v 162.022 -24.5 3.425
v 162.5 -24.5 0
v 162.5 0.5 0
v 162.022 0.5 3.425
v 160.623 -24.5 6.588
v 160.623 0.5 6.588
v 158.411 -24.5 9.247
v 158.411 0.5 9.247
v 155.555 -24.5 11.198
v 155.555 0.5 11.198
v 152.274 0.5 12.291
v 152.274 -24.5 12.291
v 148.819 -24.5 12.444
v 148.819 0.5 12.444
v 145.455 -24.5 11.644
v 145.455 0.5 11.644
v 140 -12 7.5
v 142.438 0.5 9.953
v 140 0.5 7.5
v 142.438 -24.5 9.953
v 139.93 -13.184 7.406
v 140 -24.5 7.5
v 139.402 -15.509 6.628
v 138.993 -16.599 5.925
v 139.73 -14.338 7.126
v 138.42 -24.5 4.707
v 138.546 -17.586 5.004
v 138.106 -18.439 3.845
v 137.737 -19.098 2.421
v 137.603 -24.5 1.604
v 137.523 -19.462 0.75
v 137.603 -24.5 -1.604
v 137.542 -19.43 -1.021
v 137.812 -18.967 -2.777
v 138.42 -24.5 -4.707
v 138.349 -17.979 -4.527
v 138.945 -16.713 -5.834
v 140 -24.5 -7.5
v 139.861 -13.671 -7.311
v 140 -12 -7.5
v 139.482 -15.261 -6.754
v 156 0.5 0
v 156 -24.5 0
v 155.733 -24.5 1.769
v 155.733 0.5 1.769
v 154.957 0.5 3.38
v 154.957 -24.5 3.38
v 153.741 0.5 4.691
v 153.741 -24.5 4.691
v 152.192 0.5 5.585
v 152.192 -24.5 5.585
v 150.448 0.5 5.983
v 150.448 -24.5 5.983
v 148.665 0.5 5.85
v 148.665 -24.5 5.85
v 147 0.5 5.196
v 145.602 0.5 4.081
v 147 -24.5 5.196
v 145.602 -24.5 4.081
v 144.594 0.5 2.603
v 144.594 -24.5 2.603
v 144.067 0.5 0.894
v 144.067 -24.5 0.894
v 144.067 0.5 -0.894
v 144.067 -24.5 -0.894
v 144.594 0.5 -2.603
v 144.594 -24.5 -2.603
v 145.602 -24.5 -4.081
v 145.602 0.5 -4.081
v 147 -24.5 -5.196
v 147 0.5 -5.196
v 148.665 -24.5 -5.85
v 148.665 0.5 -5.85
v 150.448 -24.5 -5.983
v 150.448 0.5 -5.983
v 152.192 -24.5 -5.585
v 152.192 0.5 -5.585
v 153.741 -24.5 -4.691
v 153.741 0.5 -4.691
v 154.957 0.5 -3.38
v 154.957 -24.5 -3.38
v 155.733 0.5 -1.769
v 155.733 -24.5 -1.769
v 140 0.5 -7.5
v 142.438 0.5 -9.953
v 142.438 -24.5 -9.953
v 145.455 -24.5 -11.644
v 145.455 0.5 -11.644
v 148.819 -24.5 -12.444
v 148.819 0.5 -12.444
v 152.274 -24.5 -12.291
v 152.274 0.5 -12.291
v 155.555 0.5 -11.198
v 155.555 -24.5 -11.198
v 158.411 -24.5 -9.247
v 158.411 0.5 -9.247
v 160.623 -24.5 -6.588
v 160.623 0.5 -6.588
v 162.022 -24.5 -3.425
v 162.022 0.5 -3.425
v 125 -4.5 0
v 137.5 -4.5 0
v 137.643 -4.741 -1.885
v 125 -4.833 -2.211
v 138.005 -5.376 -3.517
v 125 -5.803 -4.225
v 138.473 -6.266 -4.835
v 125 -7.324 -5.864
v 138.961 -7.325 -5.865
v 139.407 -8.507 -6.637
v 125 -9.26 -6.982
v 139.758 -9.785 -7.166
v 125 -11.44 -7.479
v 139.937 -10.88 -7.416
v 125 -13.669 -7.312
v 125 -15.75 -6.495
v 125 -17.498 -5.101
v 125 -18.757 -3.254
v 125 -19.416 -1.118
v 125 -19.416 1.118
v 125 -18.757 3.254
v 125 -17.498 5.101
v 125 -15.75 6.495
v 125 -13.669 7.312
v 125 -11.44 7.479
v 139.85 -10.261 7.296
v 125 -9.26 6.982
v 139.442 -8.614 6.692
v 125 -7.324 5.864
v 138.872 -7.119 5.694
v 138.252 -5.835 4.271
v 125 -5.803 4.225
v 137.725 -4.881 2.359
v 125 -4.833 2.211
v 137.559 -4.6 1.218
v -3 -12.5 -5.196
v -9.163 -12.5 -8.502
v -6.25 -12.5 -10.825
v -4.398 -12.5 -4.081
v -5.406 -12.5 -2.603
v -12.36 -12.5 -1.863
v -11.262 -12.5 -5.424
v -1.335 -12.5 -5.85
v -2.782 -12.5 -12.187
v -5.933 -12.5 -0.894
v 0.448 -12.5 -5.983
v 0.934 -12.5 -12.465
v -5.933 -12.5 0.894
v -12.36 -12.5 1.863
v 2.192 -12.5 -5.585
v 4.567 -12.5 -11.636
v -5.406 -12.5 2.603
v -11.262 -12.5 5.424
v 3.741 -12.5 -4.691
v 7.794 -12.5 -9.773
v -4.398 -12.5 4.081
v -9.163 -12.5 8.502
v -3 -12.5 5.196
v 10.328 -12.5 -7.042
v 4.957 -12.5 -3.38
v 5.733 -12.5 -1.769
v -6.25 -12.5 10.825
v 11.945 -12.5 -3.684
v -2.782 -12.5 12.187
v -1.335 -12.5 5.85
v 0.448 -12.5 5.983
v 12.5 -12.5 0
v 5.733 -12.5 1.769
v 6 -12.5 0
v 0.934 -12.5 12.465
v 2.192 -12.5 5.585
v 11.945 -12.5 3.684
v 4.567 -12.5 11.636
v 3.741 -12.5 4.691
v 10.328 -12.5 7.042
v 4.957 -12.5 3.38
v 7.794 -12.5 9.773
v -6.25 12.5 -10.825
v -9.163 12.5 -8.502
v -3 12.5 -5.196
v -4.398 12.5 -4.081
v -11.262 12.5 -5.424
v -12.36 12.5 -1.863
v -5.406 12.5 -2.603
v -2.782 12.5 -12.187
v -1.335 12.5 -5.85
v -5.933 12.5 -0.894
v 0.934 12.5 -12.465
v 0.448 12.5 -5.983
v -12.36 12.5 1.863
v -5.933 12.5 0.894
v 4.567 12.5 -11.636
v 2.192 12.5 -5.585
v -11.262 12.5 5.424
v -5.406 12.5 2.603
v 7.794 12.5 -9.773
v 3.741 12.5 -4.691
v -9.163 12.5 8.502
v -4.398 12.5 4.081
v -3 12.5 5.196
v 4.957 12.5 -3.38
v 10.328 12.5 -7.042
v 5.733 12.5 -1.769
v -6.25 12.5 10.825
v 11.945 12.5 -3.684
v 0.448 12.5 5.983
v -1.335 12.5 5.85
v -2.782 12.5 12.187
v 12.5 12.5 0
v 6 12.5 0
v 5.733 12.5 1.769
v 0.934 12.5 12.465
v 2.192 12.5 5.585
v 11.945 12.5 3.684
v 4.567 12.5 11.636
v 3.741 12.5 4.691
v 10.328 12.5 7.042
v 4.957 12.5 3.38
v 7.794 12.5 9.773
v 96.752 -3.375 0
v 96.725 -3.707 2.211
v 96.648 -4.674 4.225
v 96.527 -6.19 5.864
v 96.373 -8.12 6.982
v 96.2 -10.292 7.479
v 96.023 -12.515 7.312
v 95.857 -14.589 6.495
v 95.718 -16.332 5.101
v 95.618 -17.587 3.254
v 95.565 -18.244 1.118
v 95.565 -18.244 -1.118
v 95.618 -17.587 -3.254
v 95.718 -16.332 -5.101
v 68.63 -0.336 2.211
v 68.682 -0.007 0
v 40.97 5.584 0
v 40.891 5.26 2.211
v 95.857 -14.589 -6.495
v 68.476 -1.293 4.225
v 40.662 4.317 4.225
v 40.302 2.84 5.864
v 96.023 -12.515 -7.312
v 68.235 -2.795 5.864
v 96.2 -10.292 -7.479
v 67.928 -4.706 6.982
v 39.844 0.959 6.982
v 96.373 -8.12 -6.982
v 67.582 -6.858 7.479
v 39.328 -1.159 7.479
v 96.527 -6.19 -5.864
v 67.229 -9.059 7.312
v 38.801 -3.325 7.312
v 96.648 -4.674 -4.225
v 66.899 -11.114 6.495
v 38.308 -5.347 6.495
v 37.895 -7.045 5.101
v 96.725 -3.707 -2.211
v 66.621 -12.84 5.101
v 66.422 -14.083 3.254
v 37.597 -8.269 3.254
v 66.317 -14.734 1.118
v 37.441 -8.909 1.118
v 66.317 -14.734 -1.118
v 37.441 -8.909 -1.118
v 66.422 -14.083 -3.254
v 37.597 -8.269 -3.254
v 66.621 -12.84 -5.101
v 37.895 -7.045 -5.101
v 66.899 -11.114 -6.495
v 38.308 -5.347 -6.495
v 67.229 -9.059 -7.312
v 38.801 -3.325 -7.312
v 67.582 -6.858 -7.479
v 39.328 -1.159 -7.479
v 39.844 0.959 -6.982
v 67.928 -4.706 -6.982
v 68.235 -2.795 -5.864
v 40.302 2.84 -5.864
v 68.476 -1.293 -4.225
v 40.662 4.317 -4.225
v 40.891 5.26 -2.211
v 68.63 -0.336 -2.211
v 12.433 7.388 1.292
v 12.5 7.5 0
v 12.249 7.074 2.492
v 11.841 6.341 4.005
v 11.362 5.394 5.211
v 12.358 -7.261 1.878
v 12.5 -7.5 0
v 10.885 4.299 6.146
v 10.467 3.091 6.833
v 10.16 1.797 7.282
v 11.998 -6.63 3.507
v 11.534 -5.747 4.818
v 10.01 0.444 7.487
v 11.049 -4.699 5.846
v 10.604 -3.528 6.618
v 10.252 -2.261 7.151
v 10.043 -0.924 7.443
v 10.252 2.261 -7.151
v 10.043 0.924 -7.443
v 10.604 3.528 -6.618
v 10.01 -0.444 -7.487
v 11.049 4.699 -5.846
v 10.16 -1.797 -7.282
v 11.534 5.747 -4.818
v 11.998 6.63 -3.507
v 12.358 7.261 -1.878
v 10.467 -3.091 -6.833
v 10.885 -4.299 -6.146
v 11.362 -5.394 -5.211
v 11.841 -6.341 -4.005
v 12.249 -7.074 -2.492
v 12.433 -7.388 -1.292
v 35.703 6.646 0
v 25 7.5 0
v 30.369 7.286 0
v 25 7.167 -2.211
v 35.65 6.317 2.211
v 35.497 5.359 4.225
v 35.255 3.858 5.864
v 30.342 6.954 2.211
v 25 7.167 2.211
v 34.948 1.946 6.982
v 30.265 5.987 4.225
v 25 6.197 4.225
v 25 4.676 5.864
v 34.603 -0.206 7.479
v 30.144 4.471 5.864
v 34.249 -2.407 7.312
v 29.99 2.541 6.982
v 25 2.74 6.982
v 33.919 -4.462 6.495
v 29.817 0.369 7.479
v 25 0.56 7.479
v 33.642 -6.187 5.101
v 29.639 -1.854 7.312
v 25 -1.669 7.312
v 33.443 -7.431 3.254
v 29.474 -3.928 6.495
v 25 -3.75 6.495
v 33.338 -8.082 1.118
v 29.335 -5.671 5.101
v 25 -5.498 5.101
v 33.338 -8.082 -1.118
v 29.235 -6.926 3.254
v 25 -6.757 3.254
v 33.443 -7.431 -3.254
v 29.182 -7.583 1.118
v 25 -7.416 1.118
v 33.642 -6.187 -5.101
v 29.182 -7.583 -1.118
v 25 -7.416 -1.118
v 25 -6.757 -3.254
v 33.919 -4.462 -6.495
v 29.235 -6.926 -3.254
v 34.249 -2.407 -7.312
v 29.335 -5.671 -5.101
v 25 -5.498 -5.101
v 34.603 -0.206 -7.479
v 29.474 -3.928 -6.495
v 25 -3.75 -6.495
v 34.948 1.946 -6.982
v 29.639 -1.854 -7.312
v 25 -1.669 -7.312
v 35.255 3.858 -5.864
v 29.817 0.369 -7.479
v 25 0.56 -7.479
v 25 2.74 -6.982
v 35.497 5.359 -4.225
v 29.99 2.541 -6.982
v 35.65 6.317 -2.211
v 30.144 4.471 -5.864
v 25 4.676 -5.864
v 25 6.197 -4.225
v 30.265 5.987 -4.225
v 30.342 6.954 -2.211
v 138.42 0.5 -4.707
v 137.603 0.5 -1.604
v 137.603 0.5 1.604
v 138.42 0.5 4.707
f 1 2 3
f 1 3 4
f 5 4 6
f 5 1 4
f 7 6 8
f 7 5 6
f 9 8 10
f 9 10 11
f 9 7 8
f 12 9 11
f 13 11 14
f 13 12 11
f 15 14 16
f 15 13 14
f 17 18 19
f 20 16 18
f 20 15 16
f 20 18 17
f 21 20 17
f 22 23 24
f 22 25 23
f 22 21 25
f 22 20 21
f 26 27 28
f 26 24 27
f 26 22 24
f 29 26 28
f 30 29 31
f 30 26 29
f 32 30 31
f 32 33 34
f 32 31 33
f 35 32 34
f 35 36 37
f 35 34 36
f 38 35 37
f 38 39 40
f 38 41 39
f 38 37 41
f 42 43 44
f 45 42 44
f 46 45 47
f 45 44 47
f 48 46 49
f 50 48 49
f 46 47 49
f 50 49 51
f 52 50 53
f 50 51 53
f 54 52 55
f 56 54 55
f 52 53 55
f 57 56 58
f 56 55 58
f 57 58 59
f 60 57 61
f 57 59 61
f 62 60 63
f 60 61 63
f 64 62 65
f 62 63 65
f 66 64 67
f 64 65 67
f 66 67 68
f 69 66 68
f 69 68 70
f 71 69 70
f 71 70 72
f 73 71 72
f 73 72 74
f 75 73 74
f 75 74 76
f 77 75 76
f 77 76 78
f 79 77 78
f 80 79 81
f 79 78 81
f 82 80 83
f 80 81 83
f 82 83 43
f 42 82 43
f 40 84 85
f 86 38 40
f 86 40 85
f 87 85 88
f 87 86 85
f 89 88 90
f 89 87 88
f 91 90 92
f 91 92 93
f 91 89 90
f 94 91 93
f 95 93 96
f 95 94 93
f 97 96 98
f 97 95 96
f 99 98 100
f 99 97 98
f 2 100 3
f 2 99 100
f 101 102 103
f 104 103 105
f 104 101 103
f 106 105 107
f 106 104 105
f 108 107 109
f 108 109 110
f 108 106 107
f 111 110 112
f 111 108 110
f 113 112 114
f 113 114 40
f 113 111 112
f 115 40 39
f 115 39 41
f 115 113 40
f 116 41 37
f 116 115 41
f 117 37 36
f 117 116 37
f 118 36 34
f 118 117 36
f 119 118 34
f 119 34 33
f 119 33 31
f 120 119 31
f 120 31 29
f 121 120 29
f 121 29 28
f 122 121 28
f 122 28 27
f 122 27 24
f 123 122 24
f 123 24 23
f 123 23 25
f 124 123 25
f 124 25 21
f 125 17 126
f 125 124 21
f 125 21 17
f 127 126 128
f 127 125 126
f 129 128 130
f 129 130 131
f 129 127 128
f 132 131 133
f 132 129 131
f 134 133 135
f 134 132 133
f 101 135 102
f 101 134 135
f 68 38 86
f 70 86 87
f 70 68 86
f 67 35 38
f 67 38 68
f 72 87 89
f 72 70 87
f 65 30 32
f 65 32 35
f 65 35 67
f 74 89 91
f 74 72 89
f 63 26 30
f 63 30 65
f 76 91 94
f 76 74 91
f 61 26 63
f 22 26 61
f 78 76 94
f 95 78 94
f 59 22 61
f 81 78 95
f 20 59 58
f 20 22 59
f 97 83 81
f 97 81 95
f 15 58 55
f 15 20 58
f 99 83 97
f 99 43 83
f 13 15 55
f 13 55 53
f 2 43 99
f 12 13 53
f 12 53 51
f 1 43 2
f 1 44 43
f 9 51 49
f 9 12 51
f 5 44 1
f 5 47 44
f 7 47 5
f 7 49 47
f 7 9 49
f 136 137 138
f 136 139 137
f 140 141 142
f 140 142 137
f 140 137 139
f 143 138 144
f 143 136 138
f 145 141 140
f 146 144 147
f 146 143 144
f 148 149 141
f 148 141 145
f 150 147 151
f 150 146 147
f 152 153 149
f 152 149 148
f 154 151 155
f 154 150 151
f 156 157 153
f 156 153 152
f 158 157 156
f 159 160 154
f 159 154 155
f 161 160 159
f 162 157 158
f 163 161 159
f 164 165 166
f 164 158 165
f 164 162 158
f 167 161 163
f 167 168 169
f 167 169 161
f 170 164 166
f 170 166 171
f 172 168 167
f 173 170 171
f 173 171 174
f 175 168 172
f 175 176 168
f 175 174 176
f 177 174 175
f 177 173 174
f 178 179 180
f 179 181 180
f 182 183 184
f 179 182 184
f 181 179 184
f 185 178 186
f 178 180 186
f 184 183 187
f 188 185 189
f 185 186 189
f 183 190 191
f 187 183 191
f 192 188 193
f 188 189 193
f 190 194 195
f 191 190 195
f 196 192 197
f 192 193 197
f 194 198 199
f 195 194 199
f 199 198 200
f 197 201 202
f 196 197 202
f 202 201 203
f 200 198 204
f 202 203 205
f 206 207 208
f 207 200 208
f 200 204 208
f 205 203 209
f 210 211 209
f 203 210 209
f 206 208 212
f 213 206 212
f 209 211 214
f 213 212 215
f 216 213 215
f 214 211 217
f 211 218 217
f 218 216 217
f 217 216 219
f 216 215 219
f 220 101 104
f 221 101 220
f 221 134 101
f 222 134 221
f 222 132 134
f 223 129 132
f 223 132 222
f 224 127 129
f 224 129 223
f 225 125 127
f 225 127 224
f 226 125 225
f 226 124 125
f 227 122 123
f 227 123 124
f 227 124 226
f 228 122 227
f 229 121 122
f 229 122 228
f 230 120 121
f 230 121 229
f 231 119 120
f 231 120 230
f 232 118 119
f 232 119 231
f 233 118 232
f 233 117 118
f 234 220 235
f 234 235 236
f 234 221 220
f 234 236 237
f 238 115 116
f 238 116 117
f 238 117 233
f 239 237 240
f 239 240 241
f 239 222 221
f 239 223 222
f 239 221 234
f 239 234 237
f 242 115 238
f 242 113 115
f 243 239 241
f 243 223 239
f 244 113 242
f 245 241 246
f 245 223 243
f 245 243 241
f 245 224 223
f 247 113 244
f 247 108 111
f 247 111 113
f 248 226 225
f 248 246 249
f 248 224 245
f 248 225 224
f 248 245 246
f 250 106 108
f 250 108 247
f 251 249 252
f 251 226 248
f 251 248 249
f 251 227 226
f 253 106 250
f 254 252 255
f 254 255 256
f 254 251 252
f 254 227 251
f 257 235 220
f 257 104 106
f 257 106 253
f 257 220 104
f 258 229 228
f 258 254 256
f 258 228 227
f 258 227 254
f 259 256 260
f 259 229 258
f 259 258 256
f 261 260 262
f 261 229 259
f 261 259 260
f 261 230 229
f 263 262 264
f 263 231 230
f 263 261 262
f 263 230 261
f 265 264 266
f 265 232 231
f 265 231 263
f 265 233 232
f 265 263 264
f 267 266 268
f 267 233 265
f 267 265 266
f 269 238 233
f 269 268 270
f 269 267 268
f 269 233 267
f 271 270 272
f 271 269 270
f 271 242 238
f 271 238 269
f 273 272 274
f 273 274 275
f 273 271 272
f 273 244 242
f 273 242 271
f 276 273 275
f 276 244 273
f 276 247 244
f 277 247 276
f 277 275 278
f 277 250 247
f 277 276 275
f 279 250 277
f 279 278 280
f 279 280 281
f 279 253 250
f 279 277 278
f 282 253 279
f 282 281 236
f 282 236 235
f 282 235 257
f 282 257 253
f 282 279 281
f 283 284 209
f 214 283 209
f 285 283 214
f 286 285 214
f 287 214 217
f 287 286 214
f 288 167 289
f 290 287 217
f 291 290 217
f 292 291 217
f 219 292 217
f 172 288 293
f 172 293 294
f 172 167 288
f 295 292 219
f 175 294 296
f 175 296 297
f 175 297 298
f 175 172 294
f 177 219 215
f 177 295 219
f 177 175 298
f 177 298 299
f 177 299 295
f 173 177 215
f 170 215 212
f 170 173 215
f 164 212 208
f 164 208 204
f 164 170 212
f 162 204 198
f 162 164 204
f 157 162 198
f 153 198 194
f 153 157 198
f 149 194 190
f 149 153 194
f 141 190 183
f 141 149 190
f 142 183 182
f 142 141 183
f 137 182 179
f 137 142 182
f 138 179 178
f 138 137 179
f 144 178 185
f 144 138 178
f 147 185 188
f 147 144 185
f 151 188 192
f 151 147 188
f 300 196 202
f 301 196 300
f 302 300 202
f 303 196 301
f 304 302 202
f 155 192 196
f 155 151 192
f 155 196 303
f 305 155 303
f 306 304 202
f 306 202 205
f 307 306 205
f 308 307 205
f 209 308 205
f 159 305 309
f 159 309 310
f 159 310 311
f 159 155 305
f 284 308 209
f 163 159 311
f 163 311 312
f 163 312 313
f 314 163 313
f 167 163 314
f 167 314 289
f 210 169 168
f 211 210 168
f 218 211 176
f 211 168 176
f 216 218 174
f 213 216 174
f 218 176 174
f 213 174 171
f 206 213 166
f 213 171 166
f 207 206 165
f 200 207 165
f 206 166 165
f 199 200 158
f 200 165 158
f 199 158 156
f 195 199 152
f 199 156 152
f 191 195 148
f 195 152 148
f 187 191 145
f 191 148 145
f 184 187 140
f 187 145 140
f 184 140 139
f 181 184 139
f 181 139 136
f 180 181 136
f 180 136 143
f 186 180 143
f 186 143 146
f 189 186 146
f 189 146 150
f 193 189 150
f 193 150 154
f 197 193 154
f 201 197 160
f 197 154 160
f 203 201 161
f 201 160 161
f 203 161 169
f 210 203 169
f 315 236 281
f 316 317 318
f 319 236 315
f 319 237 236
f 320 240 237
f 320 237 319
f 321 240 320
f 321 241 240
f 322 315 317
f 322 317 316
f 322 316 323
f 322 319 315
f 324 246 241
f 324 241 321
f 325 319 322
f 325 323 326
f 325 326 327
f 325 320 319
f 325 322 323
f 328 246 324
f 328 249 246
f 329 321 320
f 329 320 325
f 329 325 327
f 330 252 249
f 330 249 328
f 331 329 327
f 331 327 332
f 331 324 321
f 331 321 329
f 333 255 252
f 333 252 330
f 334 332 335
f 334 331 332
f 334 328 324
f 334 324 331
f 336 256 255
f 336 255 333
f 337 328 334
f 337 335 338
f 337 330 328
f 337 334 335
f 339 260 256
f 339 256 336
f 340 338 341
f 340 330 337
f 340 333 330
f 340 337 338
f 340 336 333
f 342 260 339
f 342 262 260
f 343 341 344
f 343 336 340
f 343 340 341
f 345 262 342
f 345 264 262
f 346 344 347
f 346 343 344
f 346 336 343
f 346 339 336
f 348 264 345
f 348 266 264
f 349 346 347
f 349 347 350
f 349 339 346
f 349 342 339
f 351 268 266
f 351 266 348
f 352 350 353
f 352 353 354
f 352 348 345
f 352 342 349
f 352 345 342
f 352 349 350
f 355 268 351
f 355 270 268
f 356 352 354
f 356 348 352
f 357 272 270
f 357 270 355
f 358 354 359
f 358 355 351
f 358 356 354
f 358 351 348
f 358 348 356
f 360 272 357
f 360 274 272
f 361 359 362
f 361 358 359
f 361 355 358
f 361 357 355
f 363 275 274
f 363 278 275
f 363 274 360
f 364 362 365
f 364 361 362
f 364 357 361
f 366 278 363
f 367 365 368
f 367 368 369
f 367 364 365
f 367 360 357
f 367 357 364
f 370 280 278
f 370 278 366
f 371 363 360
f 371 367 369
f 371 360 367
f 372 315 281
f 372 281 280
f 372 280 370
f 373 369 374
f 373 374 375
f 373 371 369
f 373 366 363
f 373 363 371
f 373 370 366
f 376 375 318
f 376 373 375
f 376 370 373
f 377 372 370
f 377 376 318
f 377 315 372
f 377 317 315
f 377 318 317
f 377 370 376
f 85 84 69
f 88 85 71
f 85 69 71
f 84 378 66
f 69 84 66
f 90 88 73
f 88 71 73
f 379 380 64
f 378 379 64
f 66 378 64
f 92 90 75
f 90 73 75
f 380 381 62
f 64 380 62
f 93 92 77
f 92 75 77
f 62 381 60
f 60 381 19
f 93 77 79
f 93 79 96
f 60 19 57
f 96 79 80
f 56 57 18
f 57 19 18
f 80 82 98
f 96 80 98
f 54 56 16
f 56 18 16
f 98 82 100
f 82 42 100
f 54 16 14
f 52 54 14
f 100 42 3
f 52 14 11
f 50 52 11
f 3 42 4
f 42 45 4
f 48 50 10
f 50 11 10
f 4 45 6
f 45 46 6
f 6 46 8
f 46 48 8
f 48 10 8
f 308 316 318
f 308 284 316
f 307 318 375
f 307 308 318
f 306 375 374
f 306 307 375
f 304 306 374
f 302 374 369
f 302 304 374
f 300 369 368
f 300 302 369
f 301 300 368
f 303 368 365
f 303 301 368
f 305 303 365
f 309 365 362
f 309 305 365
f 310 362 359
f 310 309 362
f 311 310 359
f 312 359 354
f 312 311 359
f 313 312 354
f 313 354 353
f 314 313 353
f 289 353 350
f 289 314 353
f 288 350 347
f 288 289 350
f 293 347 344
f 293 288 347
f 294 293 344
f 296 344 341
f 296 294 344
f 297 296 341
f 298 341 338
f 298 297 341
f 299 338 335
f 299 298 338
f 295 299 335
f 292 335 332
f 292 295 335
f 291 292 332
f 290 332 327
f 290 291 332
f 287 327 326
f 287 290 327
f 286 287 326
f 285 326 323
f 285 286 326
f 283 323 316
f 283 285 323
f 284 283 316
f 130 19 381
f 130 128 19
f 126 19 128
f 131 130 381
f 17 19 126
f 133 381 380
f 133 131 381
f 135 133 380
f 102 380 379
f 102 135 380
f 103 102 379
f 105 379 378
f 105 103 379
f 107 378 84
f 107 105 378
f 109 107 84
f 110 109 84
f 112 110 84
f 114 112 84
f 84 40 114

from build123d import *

# Parameters (mm, degrees)
F1_R      = 7.5
F3_R      = 12.5
F4_DEPTH  = 12.5
F5_R      = 6
F6_DEPTH  = 25
F9_DEPTH  = 12.5
F10_R     = 6
F11_DEPTH = 25


with BuildPart() as f2:
    # F2: sweep along a path in F0
    with BuildLine(Plane.XY) as f2_path:
        Line((150, -12), (125, -12))
        ThreePointArc((125, -12), (81.789999989, -9.4166667579), (39.1955835962, -1.7034700315))
        ThreePointArc((39.1955835962, -1.7034700315), (32.1487132371, -0.4273896908), (25, 0))
        Line((25, 0), (0, 0))
    # F1 (on Right) → F2 (sweep)
    with BuildSketch(Plane.YZ):
        Circle(F1_R)
    sweep(path=f2_path.line)

    # F3 (on Front) → F4 (join, symmetric)
    with BuildSketch(Plane.XZ):
        Circle(F3_R)
    extrude(amount=F4_DEPTH, both=True)

    # F5 (on face) → F6 (cut)
    with BuildSketch(Plane.XZ.offset(12.5)):
        Circle(F5_R)
    extrude(amount=-F6_DEPTH, mode=Mode.SUBTRACT)

    # F8 (on offset) → F9 (join, symmetric)
    with BuildSketch(Plane.XZ.offset(12)):
        with BuildLine():
            Line((140, -7.5), (150, -7.5))
            Line((150, -7.5), (150, 7.5))
            Line((150, 7.5), (140, 7.5))
            ThreePointArc((140, 7.5), (137.5, 0), (140, -7.5))
        make_face()
        with BuildLine():
            Line((150, 7.5), (150, -7.5))
            Line((150, -7.5), (140, -7.5))
            ThreePointArc((140, -7.5), (153.9528470752, -11.8585412256), (162.5, 0))
            ThreePointArc((162.5, 0), (153.9528470752, 11.8585412256), (140, 7.5))
            Line((140, 7.5), (150, 7.5))
        make_face()
    extrude(amount=F9_DEPTH, both=True)

    # F10 (on face) → F11 (cut)
    with BuildSketch(Plane.XZ.offset(24.5)):
        with Locations((150, 0)):
            Circle(F10_R)
    extrude(amount=-F11_DEPTH, mode=Mode.SUBTRACT)


solid = f2.part
